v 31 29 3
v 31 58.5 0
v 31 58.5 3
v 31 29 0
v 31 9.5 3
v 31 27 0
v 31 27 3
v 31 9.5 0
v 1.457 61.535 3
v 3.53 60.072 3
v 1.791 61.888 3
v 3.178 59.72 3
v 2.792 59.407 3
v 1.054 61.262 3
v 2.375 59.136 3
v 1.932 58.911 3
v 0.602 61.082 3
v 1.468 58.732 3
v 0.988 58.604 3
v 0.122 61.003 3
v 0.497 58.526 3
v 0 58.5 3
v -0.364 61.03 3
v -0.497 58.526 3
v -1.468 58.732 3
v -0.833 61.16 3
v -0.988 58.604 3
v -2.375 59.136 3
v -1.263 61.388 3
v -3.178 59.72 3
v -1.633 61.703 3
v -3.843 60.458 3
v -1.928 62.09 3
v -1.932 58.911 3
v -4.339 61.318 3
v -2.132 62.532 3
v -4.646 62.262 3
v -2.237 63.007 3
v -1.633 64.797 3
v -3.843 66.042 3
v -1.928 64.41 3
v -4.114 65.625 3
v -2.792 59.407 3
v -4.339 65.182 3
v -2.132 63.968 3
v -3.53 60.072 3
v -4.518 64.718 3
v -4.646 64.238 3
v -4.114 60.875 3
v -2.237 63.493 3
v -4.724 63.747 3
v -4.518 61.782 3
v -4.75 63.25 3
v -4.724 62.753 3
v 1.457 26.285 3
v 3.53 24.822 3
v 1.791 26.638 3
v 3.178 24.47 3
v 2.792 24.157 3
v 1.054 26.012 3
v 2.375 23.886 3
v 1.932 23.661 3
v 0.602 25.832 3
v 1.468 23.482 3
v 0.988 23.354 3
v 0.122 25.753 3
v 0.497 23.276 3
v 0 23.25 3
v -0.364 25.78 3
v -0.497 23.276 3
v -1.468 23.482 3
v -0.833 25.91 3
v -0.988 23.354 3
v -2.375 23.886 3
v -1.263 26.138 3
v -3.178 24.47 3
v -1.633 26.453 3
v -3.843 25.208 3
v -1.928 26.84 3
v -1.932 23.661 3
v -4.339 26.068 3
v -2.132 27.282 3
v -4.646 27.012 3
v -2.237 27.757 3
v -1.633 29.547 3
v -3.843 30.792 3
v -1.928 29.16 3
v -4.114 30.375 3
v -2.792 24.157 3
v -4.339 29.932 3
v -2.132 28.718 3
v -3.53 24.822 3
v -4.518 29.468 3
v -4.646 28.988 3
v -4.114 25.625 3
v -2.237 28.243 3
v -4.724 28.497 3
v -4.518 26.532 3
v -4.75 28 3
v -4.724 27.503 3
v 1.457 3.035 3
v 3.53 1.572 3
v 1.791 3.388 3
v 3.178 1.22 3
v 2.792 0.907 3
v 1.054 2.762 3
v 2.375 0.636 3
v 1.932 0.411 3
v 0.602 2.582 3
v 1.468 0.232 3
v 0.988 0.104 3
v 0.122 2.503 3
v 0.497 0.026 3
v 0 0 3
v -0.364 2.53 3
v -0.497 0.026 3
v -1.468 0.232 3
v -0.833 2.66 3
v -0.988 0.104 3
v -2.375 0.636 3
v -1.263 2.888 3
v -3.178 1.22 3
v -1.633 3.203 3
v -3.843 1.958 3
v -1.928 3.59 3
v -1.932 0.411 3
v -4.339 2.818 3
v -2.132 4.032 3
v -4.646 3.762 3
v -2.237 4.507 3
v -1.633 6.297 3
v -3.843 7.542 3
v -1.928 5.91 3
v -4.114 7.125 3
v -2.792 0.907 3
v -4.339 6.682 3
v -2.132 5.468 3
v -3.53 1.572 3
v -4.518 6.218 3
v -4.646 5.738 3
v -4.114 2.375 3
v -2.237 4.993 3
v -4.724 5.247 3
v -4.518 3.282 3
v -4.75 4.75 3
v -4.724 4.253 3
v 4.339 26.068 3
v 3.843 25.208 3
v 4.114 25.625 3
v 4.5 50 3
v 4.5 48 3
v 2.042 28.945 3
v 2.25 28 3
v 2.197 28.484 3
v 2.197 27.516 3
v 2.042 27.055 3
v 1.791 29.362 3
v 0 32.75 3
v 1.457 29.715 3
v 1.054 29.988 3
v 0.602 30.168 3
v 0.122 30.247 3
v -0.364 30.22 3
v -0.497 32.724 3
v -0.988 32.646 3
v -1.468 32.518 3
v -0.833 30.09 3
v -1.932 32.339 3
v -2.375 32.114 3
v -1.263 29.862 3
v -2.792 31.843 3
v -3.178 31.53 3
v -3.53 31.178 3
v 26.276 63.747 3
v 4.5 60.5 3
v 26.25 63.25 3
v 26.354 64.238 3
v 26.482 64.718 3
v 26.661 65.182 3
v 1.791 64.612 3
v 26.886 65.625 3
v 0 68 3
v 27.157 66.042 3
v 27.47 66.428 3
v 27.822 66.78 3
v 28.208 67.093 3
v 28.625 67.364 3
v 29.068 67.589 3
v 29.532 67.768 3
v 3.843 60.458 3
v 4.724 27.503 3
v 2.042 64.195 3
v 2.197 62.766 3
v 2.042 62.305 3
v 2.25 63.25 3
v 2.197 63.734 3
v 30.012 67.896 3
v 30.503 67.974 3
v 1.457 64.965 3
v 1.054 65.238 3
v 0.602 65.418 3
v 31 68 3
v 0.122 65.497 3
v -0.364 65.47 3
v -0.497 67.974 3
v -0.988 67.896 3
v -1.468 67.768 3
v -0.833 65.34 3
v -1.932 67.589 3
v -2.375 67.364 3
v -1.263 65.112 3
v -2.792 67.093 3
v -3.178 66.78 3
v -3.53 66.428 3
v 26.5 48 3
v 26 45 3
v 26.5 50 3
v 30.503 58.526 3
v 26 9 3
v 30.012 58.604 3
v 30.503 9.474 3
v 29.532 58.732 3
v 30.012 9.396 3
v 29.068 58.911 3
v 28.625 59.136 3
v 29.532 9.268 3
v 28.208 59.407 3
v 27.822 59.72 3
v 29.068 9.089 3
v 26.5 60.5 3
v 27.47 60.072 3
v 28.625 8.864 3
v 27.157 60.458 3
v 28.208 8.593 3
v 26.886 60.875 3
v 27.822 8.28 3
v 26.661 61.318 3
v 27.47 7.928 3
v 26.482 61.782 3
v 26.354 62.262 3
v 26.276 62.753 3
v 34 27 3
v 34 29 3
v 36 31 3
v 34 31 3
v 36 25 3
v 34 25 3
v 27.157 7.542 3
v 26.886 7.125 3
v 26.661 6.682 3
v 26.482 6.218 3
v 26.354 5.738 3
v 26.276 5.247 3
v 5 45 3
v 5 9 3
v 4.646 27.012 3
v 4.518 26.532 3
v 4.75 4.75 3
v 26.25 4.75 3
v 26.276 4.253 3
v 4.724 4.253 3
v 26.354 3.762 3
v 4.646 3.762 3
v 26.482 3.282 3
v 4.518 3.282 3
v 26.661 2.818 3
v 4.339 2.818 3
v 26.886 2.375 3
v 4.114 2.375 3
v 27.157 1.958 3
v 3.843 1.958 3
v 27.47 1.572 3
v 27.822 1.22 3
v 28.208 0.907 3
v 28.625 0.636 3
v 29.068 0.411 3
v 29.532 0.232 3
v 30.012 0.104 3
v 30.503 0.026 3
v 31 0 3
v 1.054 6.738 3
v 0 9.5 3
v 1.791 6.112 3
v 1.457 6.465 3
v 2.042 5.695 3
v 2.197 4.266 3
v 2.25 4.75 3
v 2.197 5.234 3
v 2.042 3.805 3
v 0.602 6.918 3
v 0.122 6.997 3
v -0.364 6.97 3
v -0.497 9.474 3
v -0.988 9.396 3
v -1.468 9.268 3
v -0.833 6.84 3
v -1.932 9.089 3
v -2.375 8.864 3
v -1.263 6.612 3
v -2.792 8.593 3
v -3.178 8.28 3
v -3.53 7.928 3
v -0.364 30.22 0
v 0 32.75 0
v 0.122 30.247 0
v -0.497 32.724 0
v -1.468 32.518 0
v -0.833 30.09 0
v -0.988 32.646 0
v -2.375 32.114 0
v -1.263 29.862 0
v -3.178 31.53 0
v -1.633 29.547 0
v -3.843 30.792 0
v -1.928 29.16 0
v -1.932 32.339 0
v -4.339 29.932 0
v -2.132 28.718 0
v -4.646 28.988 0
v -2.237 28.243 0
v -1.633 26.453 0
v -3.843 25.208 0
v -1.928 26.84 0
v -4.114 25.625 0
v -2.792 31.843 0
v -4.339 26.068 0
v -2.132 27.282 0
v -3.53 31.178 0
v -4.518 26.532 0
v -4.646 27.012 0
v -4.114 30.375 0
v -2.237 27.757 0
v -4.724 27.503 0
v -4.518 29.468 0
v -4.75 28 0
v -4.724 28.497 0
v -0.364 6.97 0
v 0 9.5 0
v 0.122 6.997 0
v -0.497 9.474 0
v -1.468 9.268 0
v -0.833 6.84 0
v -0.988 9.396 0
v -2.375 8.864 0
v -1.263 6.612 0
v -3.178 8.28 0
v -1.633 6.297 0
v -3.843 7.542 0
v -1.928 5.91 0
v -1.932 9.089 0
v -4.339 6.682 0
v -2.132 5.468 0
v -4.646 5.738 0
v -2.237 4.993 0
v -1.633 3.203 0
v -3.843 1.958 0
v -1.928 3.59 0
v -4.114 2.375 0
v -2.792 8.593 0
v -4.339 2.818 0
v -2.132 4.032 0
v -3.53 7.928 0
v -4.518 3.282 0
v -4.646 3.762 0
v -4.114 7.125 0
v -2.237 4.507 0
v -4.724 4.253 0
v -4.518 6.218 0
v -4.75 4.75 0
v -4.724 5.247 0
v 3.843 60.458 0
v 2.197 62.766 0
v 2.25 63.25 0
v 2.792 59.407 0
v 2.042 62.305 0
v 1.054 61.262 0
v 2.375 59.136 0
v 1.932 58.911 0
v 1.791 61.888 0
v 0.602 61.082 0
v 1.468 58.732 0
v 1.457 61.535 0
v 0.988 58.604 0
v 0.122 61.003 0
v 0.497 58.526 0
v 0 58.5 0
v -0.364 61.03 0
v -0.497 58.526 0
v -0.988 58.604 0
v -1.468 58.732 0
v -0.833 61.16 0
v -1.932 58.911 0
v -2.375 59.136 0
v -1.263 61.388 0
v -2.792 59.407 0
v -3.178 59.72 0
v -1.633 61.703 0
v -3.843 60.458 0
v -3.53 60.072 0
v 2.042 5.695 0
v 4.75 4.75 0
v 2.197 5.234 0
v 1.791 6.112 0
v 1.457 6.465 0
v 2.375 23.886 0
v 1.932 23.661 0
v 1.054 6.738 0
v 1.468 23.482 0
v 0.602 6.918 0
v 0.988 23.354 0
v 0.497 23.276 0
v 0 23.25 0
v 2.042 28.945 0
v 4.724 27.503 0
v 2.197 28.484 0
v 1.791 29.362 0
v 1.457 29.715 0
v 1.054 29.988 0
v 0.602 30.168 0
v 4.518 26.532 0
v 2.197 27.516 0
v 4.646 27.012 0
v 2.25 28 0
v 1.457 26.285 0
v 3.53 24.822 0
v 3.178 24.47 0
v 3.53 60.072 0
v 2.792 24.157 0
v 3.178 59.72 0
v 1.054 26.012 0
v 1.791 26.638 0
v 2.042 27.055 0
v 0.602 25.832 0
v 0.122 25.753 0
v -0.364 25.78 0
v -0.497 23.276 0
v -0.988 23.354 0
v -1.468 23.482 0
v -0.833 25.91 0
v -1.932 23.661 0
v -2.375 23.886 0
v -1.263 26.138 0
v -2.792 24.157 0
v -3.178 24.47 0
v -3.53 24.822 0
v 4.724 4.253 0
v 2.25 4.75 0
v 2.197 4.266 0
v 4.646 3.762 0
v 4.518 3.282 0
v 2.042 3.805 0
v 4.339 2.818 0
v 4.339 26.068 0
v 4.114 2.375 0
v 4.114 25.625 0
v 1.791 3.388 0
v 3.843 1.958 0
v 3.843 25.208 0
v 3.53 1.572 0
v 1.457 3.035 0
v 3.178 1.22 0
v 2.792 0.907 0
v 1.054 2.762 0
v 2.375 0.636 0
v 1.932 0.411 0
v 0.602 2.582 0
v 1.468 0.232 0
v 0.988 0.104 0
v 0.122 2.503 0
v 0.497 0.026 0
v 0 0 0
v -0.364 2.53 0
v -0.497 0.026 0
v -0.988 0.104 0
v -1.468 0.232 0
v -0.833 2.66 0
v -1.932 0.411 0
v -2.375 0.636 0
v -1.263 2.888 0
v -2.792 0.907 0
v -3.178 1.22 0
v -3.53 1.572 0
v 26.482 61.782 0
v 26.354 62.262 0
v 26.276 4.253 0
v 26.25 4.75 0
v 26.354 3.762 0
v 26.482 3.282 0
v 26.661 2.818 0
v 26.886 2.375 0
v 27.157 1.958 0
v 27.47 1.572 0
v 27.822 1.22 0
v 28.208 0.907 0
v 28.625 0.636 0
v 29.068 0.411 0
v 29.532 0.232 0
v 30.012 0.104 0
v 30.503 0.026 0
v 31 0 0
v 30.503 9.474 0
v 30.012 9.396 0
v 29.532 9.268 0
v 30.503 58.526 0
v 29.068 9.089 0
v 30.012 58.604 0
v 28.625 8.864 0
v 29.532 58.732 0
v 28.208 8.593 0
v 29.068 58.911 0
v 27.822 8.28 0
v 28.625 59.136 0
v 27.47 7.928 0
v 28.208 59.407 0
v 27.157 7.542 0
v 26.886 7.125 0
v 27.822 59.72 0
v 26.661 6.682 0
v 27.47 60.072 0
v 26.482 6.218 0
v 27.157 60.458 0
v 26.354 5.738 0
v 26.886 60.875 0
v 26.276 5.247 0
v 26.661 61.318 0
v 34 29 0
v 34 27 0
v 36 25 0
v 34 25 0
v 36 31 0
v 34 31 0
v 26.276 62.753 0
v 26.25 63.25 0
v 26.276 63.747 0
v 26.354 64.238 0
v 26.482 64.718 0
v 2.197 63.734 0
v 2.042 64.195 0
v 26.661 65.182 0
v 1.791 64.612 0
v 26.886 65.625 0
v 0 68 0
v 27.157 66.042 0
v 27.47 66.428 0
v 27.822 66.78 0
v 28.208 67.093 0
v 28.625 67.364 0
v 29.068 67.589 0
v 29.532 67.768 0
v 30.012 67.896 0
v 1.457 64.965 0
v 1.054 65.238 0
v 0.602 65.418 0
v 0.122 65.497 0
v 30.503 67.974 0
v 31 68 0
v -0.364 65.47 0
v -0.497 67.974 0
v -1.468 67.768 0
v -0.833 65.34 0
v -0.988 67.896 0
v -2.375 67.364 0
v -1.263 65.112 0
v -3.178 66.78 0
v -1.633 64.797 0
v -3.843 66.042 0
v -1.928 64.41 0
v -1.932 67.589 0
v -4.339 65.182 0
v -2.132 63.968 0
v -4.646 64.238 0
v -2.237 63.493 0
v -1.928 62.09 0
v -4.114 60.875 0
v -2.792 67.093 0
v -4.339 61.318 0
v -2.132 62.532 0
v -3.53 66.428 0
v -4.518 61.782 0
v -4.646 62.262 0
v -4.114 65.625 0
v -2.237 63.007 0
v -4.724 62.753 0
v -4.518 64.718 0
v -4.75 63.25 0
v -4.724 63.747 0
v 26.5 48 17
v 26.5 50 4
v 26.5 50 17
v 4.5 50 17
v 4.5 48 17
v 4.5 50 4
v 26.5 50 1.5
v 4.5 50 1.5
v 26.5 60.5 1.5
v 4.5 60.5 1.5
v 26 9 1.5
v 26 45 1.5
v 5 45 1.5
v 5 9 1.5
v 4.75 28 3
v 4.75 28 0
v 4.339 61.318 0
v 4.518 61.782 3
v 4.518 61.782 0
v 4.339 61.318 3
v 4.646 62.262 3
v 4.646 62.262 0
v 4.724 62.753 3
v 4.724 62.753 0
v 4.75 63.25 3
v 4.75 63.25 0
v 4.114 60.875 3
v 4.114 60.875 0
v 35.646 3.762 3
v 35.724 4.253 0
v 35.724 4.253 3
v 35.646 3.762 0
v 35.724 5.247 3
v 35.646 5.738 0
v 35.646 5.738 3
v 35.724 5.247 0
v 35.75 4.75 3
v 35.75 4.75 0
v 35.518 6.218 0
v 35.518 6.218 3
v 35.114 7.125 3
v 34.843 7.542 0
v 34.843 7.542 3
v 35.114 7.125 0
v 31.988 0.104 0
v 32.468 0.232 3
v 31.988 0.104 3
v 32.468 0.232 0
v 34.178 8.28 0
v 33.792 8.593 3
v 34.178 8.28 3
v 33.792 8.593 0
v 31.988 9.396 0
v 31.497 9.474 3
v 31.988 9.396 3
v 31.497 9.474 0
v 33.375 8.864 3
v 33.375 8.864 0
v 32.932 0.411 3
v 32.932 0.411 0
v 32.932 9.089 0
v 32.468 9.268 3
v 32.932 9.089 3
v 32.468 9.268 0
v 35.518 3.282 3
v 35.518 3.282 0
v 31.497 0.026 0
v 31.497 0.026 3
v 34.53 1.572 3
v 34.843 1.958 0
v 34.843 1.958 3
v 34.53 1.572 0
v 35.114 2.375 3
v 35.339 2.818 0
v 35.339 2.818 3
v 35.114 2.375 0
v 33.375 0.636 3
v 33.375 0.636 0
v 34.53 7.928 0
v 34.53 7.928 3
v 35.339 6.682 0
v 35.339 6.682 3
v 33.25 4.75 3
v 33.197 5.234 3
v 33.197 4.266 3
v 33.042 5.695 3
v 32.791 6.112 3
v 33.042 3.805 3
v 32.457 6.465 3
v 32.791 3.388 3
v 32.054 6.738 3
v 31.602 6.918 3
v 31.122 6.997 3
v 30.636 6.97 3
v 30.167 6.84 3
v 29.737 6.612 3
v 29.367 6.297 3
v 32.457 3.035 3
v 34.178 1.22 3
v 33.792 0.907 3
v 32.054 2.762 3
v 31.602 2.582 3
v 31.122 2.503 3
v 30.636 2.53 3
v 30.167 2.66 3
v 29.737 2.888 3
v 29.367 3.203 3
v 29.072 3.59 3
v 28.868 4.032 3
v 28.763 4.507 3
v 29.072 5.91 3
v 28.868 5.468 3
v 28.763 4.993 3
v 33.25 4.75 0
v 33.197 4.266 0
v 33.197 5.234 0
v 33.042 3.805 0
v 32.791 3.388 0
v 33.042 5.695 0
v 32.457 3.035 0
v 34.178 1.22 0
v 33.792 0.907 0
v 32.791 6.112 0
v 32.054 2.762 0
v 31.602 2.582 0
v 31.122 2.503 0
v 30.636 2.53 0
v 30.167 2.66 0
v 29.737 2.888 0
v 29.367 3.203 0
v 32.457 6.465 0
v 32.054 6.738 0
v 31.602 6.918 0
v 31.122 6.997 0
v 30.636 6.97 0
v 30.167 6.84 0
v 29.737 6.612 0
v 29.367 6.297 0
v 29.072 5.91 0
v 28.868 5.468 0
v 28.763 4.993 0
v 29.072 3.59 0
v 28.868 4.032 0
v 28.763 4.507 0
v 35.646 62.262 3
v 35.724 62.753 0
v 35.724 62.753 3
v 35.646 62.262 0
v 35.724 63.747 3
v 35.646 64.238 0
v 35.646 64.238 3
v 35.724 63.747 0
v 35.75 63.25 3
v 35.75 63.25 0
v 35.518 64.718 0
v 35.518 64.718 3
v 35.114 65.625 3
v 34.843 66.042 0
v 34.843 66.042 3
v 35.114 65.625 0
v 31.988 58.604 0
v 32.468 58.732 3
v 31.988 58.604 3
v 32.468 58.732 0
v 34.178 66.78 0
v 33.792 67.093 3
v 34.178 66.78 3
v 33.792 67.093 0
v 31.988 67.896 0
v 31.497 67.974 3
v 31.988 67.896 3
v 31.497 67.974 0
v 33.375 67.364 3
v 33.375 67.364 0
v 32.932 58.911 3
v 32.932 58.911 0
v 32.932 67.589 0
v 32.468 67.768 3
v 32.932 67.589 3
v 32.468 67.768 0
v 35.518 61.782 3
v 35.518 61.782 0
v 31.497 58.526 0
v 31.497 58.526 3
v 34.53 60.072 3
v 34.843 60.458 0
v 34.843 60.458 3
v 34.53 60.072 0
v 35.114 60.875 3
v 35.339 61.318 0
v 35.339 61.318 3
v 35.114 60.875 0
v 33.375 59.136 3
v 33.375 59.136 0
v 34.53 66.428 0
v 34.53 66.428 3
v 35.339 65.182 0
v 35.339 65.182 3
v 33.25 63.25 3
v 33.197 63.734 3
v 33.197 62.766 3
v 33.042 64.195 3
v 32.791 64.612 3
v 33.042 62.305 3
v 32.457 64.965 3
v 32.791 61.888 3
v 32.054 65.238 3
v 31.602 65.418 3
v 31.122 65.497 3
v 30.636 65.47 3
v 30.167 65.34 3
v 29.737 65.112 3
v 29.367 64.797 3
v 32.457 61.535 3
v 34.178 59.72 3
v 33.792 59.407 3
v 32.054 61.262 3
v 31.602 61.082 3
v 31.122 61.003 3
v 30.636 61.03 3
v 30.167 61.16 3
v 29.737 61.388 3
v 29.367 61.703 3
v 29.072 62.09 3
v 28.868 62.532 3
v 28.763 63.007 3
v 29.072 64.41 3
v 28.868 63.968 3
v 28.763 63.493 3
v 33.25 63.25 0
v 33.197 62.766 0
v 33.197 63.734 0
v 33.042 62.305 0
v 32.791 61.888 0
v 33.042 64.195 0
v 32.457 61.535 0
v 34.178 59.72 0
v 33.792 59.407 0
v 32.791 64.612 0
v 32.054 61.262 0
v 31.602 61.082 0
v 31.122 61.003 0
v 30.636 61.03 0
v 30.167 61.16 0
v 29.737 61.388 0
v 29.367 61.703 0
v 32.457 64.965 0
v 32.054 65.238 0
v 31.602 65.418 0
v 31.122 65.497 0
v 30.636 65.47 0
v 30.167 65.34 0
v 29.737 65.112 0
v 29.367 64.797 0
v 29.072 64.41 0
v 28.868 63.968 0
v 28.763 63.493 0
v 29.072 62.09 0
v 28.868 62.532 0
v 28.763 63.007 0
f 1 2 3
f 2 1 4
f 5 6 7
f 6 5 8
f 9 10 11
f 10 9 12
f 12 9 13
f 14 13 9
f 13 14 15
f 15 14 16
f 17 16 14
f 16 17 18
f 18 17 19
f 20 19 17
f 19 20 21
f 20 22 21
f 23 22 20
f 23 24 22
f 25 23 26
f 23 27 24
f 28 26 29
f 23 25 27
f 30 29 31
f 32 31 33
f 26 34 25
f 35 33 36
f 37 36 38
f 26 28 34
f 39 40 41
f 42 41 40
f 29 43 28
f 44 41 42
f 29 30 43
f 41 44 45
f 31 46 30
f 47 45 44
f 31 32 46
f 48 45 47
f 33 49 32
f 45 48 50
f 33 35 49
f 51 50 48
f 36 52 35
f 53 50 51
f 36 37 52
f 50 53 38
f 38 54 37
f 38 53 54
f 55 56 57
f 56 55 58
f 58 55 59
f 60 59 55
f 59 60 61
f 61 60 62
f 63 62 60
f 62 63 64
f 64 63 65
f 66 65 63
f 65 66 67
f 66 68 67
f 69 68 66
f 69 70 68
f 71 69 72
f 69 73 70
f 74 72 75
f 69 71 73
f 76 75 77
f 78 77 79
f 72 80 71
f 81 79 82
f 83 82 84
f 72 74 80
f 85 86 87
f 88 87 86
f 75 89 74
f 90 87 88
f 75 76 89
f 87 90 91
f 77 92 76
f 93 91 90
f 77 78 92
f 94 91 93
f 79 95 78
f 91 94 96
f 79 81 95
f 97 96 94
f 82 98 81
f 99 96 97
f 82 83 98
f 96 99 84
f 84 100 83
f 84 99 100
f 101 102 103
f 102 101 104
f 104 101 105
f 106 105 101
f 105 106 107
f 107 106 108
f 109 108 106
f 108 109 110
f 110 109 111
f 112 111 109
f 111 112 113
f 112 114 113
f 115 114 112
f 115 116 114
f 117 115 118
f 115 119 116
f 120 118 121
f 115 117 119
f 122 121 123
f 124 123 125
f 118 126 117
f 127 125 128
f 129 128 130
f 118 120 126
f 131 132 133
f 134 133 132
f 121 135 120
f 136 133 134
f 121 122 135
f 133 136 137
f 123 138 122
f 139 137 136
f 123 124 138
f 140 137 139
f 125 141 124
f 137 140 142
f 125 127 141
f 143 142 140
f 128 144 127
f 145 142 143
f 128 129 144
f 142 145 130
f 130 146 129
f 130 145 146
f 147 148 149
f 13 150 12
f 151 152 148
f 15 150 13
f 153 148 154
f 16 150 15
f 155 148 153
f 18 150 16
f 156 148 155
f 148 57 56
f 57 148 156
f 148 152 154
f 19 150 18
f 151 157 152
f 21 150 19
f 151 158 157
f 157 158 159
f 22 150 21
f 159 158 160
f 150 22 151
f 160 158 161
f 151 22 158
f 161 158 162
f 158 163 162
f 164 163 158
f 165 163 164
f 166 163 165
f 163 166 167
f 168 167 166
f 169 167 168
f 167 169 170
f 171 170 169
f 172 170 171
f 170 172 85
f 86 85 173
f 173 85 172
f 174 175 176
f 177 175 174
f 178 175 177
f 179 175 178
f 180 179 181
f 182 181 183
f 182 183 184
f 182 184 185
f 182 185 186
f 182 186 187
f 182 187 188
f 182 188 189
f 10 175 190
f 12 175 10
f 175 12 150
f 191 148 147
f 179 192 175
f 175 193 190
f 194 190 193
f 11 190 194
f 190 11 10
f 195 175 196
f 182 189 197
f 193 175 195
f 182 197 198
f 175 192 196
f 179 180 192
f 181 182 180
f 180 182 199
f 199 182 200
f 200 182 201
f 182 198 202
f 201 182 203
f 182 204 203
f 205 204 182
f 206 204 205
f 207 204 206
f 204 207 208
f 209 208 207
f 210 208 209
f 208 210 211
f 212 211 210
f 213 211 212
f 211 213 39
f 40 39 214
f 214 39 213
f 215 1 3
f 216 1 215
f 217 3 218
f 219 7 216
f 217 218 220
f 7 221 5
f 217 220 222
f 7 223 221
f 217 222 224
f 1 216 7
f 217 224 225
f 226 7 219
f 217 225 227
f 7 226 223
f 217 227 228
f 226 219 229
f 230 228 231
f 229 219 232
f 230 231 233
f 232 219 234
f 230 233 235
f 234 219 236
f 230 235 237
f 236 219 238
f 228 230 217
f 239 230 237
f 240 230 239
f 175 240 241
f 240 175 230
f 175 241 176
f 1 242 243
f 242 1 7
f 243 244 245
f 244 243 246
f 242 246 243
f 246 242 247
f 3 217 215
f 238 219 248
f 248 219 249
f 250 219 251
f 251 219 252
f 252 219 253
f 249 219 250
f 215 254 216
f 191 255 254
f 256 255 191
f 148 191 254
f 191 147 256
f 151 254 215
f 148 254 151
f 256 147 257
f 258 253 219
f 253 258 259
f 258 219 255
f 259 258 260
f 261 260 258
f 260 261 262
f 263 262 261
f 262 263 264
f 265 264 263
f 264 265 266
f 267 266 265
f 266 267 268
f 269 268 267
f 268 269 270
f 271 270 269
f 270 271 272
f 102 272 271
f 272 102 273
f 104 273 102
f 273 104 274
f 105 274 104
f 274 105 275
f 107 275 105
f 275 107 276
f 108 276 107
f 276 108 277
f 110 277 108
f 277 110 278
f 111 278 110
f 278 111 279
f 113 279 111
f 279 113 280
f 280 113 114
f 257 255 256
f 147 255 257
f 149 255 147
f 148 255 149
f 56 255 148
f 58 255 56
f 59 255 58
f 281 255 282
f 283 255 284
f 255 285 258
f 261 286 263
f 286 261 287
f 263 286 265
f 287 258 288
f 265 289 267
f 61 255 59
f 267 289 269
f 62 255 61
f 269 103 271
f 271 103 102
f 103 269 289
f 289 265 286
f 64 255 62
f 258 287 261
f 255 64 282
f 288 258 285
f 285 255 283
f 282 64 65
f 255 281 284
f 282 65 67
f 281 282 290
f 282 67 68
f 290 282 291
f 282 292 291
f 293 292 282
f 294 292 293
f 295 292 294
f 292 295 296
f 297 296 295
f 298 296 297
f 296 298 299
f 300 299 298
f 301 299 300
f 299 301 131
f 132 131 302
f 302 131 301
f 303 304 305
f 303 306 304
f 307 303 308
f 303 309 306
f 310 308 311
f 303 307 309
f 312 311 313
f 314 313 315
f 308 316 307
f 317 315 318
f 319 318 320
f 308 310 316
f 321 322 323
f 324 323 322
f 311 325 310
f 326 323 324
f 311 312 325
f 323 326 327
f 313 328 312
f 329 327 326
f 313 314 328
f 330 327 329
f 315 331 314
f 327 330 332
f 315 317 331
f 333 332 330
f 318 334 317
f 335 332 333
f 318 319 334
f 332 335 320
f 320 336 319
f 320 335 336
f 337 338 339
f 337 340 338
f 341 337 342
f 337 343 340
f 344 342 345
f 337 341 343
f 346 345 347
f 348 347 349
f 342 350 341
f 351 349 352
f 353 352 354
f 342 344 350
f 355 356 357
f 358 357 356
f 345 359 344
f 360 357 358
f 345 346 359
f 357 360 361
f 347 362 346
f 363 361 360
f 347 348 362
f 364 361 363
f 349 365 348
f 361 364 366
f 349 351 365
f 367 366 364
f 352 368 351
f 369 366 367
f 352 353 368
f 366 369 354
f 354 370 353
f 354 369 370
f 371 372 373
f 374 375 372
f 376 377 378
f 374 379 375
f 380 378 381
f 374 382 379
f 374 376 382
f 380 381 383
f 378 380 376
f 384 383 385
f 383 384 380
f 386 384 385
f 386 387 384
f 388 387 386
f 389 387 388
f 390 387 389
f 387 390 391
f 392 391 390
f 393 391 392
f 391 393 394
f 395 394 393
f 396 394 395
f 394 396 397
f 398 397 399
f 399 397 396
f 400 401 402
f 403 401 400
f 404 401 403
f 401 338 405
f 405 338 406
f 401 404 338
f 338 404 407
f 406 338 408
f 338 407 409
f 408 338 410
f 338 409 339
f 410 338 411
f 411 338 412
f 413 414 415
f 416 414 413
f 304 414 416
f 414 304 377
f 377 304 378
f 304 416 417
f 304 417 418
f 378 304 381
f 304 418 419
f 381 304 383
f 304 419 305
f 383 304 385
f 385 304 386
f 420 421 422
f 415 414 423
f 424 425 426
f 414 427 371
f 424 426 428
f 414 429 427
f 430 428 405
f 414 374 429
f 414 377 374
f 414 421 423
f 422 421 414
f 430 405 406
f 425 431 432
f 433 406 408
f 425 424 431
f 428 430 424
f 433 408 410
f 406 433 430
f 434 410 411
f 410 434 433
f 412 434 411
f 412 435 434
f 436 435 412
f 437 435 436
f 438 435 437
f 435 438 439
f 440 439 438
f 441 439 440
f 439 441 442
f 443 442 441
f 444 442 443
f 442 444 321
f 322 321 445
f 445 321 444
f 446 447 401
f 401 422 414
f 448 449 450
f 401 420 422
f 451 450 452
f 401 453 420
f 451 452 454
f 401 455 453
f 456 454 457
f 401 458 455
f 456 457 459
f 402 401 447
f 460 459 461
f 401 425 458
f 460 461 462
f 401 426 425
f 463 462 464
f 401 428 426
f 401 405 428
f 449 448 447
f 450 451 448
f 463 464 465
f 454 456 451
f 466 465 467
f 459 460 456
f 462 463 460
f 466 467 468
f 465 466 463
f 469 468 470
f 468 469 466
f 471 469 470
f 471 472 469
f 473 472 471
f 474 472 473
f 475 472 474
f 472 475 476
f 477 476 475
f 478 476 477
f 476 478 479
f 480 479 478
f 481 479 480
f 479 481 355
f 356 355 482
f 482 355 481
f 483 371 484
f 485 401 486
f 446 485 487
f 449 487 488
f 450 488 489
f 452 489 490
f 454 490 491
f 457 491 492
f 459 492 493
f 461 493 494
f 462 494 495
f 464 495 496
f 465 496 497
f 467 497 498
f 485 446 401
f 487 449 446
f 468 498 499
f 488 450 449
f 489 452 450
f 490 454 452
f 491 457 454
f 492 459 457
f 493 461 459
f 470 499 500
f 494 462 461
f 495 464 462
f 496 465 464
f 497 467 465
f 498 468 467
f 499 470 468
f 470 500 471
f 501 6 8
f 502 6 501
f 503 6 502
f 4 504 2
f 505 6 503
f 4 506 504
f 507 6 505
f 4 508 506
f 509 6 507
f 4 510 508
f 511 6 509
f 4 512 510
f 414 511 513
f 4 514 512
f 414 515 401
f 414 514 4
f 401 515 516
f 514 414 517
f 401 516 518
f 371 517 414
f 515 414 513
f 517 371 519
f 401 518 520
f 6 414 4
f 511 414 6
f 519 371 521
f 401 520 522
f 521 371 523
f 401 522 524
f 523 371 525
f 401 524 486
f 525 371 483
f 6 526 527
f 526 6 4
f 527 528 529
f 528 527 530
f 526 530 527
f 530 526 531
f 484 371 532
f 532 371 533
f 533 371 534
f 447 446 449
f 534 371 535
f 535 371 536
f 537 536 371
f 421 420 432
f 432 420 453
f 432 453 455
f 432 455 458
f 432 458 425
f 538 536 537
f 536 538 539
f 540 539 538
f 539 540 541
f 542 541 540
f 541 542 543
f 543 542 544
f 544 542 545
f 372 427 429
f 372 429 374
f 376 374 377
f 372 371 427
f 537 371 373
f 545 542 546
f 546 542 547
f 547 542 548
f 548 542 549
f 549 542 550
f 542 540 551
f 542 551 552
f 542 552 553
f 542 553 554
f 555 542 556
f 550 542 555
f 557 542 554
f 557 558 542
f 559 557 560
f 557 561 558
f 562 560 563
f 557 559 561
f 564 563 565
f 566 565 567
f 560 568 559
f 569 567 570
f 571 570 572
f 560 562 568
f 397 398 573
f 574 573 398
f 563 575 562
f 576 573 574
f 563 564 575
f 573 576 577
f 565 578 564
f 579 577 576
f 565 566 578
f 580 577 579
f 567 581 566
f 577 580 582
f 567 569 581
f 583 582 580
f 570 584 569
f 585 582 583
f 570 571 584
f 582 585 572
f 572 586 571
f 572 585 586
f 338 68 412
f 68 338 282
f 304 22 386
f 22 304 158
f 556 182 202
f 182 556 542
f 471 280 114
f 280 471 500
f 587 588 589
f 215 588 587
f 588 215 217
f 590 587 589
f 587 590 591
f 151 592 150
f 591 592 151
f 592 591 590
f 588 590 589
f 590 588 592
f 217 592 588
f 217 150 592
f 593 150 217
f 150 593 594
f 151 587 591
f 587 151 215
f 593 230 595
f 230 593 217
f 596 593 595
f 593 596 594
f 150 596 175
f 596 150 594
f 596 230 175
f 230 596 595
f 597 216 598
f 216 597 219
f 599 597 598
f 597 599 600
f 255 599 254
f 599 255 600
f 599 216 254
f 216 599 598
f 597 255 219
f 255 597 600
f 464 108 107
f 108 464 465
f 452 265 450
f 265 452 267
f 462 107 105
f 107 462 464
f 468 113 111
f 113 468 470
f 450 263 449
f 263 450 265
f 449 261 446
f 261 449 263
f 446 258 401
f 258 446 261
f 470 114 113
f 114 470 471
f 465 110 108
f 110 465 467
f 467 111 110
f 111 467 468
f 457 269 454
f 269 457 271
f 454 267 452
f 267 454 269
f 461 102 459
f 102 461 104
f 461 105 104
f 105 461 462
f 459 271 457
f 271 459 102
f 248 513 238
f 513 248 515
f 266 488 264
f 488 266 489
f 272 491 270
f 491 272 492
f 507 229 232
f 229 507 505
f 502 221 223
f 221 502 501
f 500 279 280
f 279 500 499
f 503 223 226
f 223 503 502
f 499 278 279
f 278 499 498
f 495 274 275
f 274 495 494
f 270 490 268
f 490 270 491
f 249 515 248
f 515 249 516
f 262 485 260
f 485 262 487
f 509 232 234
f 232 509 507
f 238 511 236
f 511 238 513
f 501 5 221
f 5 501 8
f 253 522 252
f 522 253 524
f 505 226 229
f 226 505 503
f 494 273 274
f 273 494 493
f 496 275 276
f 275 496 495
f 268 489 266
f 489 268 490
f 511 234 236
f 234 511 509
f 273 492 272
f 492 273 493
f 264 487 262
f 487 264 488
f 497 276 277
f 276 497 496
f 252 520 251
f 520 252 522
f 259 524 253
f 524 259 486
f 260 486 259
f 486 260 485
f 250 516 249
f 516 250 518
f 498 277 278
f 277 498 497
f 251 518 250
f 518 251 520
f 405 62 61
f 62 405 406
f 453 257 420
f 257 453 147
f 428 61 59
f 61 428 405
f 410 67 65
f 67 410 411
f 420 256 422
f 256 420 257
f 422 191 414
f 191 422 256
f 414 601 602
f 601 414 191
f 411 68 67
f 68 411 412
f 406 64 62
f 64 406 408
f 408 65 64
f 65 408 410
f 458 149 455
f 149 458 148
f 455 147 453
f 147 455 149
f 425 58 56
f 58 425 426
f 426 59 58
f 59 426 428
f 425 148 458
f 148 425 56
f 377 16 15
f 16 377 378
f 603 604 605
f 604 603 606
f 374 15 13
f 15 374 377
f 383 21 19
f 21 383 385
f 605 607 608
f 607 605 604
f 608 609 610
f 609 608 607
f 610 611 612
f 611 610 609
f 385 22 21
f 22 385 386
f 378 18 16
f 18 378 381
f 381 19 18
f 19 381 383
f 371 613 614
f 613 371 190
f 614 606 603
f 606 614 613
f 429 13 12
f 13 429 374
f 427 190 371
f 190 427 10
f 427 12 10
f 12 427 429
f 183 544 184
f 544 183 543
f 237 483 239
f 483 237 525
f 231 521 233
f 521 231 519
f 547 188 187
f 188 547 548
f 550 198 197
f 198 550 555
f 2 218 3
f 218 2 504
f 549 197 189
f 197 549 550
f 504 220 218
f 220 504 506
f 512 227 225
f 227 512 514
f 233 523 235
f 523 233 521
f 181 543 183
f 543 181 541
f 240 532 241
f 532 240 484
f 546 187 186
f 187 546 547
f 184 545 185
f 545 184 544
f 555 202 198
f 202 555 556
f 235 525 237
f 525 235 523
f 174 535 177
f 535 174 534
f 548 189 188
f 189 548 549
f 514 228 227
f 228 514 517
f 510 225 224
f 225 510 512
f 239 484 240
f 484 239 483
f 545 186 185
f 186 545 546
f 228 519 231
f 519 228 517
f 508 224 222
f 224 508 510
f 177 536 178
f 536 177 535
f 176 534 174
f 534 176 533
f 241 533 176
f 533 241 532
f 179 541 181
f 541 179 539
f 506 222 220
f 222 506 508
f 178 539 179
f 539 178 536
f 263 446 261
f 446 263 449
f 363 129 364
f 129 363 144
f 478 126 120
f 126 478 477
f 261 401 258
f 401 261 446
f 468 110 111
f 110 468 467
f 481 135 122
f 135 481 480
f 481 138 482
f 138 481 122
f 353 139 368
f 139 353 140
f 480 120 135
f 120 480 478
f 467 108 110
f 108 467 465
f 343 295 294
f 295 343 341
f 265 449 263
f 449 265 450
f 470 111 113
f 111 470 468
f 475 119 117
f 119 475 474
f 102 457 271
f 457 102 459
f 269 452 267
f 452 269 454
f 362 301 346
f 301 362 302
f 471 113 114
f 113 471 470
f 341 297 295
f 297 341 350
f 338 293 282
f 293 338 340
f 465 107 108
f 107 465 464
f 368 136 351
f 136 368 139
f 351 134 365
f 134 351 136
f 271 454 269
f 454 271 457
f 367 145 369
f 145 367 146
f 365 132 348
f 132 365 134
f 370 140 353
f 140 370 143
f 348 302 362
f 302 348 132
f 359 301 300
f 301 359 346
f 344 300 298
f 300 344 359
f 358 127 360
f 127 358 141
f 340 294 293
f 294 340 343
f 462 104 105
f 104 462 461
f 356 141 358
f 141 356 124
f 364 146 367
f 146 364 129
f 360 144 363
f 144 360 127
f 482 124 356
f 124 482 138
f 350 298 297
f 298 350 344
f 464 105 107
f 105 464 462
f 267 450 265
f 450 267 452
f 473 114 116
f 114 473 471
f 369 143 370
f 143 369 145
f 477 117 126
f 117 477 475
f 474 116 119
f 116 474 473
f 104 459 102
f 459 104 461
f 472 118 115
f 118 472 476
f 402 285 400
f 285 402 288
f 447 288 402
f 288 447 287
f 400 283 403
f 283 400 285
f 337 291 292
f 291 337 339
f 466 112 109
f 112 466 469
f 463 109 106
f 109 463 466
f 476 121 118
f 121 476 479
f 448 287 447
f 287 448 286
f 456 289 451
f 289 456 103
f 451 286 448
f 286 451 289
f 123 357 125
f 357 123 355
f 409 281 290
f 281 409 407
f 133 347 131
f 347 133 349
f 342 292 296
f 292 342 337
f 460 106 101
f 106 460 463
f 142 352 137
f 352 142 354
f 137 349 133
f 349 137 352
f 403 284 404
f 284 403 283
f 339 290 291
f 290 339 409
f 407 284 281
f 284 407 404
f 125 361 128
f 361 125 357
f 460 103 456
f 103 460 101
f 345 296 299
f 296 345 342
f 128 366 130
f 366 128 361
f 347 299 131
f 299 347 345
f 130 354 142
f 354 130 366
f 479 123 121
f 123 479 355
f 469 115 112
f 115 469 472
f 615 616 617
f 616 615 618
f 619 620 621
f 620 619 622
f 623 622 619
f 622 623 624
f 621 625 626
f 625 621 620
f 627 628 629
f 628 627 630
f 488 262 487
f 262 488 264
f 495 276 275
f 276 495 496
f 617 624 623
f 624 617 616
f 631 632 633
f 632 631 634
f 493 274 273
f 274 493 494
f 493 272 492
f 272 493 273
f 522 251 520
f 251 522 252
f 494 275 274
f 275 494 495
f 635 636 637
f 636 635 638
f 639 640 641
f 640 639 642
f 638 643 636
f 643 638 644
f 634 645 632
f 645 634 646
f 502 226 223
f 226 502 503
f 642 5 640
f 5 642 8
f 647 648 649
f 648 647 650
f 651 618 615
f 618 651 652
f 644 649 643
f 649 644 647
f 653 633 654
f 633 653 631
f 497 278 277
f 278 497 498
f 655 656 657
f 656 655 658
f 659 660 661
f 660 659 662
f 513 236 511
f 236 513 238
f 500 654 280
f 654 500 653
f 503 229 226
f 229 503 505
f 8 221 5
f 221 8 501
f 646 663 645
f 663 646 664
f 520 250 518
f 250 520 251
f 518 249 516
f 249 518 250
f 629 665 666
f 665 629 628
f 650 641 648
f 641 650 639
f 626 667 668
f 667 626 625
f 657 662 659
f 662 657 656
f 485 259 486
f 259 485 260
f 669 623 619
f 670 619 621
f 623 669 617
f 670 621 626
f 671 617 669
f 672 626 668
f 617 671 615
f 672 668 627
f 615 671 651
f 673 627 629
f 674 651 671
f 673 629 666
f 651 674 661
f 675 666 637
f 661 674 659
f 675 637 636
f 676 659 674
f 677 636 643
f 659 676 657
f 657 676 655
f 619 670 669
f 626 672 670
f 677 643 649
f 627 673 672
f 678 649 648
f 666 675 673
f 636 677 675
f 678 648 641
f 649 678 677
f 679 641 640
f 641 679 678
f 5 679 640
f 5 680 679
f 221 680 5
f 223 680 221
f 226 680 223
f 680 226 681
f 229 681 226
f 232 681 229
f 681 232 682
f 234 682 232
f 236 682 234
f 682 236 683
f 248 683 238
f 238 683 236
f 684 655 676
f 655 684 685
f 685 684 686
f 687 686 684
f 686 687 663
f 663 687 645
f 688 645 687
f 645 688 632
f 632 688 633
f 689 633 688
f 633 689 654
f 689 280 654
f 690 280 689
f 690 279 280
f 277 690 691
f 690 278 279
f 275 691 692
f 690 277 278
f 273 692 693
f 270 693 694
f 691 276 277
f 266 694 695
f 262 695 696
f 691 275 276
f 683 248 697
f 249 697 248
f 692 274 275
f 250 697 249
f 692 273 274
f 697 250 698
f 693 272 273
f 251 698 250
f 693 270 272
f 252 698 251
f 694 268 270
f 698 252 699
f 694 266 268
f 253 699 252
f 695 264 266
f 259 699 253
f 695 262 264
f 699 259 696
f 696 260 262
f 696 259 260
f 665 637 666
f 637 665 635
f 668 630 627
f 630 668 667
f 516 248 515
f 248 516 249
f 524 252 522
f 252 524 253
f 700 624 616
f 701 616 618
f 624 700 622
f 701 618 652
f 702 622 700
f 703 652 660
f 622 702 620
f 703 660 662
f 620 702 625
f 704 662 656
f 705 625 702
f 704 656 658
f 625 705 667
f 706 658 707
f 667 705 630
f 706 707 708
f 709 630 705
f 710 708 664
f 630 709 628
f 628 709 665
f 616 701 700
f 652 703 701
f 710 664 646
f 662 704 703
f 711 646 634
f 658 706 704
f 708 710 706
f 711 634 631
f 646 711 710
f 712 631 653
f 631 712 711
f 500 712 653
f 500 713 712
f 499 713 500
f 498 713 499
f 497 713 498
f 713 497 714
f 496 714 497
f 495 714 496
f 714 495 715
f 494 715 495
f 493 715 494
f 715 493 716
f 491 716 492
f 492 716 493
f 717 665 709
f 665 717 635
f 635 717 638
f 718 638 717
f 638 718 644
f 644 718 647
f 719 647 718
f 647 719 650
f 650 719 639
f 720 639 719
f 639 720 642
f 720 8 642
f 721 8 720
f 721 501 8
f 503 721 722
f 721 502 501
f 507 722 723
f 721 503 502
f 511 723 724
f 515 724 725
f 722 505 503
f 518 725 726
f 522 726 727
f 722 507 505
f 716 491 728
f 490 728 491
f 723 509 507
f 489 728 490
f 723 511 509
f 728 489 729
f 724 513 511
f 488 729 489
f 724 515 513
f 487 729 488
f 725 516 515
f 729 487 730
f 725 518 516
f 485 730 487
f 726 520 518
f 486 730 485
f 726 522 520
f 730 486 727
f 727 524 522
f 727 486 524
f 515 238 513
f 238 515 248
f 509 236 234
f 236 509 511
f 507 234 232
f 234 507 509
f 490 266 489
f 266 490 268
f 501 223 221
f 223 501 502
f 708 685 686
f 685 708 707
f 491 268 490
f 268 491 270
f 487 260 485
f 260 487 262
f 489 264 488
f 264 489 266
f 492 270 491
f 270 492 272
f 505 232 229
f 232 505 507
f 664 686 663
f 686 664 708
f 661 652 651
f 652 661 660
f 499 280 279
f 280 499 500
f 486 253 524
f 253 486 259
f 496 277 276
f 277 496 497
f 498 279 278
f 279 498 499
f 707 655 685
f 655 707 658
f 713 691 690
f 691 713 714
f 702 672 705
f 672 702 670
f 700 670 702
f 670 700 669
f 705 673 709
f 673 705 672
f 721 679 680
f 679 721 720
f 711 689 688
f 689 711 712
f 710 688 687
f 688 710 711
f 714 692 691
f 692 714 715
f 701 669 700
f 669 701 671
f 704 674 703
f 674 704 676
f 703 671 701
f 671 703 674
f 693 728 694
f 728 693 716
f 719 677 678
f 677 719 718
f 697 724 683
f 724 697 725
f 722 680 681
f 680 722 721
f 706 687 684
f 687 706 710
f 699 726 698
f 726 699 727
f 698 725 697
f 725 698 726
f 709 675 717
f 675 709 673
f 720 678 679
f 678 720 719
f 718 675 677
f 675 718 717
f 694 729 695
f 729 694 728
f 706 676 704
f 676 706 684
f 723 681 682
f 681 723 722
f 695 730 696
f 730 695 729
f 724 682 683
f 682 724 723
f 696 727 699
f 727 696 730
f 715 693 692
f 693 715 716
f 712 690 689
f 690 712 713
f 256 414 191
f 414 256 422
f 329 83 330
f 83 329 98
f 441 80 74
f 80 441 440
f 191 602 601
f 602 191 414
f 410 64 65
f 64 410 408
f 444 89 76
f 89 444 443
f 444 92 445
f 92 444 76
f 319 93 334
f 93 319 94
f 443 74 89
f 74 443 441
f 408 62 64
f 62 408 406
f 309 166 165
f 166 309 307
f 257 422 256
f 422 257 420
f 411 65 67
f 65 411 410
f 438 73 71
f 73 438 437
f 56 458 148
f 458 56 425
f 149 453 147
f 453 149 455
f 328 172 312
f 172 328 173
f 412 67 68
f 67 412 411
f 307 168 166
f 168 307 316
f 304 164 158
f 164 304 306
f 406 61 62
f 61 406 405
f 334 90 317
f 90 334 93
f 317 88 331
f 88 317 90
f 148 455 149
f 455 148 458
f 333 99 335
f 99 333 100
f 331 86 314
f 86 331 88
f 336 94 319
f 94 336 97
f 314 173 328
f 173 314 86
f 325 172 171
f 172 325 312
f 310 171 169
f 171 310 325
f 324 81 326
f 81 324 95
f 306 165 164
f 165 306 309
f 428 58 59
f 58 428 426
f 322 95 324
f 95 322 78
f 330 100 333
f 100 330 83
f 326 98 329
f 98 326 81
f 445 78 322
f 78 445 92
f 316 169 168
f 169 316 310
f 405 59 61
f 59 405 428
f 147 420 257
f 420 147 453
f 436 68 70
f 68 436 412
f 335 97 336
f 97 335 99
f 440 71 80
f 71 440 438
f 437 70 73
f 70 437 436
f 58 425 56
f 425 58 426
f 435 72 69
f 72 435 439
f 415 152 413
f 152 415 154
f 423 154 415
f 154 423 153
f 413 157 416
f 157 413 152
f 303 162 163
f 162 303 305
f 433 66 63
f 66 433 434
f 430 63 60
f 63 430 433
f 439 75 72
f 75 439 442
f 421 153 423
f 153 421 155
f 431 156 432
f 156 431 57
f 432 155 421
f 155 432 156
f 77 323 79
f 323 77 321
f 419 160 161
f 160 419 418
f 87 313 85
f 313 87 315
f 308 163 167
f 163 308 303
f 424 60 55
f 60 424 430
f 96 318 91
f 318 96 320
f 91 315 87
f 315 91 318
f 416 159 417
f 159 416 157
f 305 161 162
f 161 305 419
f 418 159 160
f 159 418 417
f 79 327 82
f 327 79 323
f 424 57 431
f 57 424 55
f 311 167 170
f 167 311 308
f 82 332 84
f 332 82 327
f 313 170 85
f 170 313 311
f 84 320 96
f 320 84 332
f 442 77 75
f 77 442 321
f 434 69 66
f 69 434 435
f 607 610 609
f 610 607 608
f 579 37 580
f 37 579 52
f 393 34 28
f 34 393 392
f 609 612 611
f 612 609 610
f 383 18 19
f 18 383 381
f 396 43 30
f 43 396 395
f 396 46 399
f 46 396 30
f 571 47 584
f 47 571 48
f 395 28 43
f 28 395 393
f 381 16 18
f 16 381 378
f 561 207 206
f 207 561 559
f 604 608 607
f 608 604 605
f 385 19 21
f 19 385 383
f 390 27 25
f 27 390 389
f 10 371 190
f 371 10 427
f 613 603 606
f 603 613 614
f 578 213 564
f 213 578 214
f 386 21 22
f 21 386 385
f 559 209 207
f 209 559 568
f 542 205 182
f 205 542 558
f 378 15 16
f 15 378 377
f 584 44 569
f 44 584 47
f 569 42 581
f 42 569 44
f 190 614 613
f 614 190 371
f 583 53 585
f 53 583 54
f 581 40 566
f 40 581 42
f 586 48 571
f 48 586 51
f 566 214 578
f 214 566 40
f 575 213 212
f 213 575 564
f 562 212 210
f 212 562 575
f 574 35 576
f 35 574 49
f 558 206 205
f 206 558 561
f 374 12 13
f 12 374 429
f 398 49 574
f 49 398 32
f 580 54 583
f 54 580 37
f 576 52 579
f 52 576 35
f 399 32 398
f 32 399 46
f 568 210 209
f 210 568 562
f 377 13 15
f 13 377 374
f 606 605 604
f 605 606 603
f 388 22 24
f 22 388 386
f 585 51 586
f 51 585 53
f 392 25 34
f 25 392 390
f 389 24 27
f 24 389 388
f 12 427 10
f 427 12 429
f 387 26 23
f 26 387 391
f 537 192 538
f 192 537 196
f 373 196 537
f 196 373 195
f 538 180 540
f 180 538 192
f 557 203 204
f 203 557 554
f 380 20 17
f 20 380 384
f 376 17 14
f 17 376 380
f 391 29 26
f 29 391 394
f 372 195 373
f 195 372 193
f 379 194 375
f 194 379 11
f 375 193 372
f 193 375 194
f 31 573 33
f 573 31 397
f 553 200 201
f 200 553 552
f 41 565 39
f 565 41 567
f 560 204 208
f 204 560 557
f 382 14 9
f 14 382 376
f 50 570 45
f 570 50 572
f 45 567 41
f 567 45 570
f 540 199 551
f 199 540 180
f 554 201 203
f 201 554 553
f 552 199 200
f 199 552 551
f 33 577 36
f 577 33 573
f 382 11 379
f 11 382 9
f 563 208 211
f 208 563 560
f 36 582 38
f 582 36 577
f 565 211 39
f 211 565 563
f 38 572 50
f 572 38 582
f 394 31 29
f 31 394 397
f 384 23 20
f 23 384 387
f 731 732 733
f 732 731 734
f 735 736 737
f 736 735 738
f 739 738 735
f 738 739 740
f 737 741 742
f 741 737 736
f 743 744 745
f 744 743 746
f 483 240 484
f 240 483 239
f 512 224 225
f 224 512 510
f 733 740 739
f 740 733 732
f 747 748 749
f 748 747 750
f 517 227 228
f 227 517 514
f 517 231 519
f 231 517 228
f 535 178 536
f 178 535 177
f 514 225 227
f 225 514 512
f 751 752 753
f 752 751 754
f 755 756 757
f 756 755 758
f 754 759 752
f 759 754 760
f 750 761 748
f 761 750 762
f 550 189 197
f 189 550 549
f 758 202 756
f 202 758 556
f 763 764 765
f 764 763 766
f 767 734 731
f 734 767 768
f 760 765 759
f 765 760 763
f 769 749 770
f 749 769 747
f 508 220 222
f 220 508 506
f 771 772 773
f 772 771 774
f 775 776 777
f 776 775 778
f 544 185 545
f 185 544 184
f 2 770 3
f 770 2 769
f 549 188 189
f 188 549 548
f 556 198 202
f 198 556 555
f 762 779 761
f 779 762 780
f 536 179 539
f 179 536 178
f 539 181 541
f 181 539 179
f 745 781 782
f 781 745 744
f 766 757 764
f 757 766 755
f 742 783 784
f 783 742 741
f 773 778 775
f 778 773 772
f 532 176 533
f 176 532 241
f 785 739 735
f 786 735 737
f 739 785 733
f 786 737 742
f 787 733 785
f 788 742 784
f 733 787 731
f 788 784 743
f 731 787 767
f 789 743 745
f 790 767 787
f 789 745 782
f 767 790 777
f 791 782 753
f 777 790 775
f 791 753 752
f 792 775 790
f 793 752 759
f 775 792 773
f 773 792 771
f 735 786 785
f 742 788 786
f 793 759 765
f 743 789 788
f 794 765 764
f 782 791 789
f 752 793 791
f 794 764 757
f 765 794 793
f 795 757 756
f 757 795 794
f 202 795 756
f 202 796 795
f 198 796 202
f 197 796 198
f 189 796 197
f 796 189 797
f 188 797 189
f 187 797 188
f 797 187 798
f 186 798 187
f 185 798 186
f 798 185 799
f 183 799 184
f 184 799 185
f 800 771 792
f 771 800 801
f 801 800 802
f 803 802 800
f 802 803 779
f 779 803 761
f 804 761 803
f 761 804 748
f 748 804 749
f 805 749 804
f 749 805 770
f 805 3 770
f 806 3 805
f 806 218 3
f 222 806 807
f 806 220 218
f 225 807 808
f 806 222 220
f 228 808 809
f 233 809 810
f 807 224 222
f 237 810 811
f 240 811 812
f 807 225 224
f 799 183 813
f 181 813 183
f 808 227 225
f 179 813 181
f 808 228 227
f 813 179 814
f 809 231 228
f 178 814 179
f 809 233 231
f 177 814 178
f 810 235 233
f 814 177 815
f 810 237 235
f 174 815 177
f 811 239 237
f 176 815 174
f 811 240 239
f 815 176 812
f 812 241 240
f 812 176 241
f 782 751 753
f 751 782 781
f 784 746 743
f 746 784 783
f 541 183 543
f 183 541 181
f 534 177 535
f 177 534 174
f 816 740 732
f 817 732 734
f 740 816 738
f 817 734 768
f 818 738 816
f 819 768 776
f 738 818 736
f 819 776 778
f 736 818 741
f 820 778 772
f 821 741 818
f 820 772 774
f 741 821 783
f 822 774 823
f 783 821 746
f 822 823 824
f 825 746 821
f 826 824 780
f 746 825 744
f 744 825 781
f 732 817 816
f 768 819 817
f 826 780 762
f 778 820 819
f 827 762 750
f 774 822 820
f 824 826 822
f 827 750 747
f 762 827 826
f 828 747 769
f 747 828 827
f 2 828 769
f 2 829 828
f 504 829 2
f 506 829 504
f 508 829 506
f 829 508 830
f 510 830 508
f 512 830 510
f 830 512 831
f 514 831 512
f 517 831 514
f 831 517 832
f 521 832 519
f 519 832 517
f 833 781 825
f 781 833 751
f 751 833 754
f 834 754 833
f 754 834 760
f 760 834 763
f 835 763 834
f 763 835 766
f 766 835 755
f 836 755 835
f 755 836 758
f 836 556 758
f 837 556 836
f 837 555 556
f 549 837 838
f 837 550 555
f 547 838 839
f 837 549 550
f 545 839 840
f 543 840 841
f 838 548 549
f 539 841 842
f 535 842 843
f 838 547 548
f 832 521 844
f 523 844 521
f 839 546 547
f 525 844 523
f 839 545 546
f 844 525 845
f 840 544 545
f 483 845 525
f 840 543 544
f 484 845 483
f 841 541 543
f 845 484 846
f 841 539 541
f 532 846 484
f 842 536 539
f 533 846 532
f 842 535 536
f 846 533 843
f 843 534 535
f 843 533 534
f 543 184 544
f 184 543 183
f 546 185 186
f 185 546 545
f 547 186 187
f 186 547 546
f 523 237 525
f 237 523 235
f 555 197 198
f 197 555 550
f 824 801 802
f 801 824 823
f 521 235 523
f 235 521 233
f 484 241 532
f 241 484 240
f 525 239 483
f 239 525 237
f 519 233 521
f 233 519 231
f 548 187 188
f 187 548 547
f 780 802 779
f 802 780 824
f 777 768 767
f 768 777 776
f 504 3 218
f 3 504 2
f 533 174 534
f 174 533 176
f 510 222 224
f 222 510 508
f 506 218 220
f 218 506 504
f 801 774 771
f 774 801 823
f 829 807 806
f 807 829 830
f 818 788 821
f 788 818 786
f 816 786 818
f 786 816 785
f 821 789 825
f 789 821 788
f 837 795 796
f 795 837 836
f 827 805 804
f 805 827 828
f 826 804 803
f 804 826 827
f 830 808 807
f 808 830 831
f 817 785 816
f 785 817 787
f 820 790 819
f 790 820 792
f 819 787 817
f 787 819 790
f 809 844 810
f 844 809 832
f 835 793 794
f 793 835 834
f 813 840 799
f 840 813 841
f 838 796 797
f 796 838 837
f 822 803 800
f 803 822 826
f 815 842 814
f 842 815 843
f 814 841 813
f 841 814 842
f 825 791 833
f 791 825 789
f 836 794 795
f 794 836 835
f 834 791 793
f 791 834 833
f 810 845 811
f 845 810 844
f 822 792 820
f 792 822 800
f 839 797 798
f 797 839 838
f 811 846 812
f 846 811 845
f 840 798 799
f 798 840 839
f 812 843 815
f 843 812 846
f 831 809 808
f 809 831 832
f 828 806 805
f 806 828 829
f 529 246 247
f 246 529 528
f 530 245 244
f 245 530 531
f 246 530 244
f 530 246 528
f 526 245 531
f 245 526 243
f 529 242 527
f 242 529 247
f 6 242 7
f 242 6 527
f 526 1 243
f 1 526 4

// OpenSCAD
$fa = 0.5; // default minimum facet angle is now 0.5
$fs = 0.5; // default minimum facet size is now 0.5 

wall_thickness = 2.5;
wall_height = 5;

plate_width = 31;
plate_height = 68;

plate_thickness = 3;

hole_cutout_width = 5;
hole_cutout_camera = 4;

recession = 1.5;

camera_length = 22;
camera_width = 10.5;
camera_height = 14;
camera_wall = 2;

rubber_hole_inside = 4.5;
rubber_hole_thickness = 2.5;

chip_width = 21;
chip_height = 36;

chip_offset = 9;
camera_cutout_offset = 50;

rubber_offset = 28; // center of hole

t_width=6;
t_height=5;
t_cross=2;

module t() {
    translate([0,t_height-t_cross,0]) cube([t_width,t_cross,plate_thickness]);
    translate([(t_width-t_cross)/2,0,0]) cube([t_cross,t_height-t_cross,plate_thickness]);
}

module rubber_hole(solid=false) {
    
    height = solid ? plate_thickness+2 : plate_thickness;
    z = solid ? -1 : 0;
    difference() {
        translate([0,0,z]) cylinder(h=height, r=(rubber_hole_inside/2)+rubber_hole_thickness);
        if (!solid) {
        translate([0,0,-1]) 
            cylinder(h=plate_thickness+2, r=rubber_hole_inside/2);
        }
    }
}

difference() {
    union() {
        cube([plate_width, plate_height, plate_thickness]);
        translate([(plate_width-camera_length)/2, camera_cutout_offset-camera_wall, plate_thickness]) 
            cube([camera_length, camera_wall, camera_height]);
    }
    
    translate([(plate_width-camera_length)/2, camera_cutout_offset, plate_thickness-recession]) 
        cube([camera_length, camera_width, recession+1]);
    translate([(plate_width-chip_width)/2, chip_offset, plate_thickness-recession]) 
        cube([chip_width,chip_height,recession+1]);
    translate([0,rubber_hole_inside/2+rubber_hole_thickness,0]) 
        rubber_hole(true);
    translate([plate_width,rubber_hole_inside/2+rubber_hole_thickness])         
        rubber_hole(true);
    translate([0, rubber_offset, 0])         
        rubber_hole(true);
    translate([0,plate_height-(rubber_hole_inside/2+rubber_hole_thickness),0]) 
        rubber_hole(true);
    translate([plate_width,plate_height-(rubber_hole_inside/2+rubber_hole_thickness),0])         
        rubber_hole(true);


}
translate([0,rubber_hole_inside/2+rubber_hole_thickness,0]) rubber_hole();
translate([plate_width,rubber_hole_inside/2+rubber_hole_thickness]) rubber_hole();
translate([0, rubber_offset, 0]) rubber_hole(false);
translate([0,plate_height-(rubber_hole_inside/2+rubber_hole_thickness),0]) 
    rubber_hole(false);
translate([plate_width,plate_height-(rubber_hole_inside/2+rubber_hole_thickness),0]) 
    rubber_hole(false);
translate([plate_width, rubber_offset+t_width/2, 0]) rotate([0,0,-90]) t();
